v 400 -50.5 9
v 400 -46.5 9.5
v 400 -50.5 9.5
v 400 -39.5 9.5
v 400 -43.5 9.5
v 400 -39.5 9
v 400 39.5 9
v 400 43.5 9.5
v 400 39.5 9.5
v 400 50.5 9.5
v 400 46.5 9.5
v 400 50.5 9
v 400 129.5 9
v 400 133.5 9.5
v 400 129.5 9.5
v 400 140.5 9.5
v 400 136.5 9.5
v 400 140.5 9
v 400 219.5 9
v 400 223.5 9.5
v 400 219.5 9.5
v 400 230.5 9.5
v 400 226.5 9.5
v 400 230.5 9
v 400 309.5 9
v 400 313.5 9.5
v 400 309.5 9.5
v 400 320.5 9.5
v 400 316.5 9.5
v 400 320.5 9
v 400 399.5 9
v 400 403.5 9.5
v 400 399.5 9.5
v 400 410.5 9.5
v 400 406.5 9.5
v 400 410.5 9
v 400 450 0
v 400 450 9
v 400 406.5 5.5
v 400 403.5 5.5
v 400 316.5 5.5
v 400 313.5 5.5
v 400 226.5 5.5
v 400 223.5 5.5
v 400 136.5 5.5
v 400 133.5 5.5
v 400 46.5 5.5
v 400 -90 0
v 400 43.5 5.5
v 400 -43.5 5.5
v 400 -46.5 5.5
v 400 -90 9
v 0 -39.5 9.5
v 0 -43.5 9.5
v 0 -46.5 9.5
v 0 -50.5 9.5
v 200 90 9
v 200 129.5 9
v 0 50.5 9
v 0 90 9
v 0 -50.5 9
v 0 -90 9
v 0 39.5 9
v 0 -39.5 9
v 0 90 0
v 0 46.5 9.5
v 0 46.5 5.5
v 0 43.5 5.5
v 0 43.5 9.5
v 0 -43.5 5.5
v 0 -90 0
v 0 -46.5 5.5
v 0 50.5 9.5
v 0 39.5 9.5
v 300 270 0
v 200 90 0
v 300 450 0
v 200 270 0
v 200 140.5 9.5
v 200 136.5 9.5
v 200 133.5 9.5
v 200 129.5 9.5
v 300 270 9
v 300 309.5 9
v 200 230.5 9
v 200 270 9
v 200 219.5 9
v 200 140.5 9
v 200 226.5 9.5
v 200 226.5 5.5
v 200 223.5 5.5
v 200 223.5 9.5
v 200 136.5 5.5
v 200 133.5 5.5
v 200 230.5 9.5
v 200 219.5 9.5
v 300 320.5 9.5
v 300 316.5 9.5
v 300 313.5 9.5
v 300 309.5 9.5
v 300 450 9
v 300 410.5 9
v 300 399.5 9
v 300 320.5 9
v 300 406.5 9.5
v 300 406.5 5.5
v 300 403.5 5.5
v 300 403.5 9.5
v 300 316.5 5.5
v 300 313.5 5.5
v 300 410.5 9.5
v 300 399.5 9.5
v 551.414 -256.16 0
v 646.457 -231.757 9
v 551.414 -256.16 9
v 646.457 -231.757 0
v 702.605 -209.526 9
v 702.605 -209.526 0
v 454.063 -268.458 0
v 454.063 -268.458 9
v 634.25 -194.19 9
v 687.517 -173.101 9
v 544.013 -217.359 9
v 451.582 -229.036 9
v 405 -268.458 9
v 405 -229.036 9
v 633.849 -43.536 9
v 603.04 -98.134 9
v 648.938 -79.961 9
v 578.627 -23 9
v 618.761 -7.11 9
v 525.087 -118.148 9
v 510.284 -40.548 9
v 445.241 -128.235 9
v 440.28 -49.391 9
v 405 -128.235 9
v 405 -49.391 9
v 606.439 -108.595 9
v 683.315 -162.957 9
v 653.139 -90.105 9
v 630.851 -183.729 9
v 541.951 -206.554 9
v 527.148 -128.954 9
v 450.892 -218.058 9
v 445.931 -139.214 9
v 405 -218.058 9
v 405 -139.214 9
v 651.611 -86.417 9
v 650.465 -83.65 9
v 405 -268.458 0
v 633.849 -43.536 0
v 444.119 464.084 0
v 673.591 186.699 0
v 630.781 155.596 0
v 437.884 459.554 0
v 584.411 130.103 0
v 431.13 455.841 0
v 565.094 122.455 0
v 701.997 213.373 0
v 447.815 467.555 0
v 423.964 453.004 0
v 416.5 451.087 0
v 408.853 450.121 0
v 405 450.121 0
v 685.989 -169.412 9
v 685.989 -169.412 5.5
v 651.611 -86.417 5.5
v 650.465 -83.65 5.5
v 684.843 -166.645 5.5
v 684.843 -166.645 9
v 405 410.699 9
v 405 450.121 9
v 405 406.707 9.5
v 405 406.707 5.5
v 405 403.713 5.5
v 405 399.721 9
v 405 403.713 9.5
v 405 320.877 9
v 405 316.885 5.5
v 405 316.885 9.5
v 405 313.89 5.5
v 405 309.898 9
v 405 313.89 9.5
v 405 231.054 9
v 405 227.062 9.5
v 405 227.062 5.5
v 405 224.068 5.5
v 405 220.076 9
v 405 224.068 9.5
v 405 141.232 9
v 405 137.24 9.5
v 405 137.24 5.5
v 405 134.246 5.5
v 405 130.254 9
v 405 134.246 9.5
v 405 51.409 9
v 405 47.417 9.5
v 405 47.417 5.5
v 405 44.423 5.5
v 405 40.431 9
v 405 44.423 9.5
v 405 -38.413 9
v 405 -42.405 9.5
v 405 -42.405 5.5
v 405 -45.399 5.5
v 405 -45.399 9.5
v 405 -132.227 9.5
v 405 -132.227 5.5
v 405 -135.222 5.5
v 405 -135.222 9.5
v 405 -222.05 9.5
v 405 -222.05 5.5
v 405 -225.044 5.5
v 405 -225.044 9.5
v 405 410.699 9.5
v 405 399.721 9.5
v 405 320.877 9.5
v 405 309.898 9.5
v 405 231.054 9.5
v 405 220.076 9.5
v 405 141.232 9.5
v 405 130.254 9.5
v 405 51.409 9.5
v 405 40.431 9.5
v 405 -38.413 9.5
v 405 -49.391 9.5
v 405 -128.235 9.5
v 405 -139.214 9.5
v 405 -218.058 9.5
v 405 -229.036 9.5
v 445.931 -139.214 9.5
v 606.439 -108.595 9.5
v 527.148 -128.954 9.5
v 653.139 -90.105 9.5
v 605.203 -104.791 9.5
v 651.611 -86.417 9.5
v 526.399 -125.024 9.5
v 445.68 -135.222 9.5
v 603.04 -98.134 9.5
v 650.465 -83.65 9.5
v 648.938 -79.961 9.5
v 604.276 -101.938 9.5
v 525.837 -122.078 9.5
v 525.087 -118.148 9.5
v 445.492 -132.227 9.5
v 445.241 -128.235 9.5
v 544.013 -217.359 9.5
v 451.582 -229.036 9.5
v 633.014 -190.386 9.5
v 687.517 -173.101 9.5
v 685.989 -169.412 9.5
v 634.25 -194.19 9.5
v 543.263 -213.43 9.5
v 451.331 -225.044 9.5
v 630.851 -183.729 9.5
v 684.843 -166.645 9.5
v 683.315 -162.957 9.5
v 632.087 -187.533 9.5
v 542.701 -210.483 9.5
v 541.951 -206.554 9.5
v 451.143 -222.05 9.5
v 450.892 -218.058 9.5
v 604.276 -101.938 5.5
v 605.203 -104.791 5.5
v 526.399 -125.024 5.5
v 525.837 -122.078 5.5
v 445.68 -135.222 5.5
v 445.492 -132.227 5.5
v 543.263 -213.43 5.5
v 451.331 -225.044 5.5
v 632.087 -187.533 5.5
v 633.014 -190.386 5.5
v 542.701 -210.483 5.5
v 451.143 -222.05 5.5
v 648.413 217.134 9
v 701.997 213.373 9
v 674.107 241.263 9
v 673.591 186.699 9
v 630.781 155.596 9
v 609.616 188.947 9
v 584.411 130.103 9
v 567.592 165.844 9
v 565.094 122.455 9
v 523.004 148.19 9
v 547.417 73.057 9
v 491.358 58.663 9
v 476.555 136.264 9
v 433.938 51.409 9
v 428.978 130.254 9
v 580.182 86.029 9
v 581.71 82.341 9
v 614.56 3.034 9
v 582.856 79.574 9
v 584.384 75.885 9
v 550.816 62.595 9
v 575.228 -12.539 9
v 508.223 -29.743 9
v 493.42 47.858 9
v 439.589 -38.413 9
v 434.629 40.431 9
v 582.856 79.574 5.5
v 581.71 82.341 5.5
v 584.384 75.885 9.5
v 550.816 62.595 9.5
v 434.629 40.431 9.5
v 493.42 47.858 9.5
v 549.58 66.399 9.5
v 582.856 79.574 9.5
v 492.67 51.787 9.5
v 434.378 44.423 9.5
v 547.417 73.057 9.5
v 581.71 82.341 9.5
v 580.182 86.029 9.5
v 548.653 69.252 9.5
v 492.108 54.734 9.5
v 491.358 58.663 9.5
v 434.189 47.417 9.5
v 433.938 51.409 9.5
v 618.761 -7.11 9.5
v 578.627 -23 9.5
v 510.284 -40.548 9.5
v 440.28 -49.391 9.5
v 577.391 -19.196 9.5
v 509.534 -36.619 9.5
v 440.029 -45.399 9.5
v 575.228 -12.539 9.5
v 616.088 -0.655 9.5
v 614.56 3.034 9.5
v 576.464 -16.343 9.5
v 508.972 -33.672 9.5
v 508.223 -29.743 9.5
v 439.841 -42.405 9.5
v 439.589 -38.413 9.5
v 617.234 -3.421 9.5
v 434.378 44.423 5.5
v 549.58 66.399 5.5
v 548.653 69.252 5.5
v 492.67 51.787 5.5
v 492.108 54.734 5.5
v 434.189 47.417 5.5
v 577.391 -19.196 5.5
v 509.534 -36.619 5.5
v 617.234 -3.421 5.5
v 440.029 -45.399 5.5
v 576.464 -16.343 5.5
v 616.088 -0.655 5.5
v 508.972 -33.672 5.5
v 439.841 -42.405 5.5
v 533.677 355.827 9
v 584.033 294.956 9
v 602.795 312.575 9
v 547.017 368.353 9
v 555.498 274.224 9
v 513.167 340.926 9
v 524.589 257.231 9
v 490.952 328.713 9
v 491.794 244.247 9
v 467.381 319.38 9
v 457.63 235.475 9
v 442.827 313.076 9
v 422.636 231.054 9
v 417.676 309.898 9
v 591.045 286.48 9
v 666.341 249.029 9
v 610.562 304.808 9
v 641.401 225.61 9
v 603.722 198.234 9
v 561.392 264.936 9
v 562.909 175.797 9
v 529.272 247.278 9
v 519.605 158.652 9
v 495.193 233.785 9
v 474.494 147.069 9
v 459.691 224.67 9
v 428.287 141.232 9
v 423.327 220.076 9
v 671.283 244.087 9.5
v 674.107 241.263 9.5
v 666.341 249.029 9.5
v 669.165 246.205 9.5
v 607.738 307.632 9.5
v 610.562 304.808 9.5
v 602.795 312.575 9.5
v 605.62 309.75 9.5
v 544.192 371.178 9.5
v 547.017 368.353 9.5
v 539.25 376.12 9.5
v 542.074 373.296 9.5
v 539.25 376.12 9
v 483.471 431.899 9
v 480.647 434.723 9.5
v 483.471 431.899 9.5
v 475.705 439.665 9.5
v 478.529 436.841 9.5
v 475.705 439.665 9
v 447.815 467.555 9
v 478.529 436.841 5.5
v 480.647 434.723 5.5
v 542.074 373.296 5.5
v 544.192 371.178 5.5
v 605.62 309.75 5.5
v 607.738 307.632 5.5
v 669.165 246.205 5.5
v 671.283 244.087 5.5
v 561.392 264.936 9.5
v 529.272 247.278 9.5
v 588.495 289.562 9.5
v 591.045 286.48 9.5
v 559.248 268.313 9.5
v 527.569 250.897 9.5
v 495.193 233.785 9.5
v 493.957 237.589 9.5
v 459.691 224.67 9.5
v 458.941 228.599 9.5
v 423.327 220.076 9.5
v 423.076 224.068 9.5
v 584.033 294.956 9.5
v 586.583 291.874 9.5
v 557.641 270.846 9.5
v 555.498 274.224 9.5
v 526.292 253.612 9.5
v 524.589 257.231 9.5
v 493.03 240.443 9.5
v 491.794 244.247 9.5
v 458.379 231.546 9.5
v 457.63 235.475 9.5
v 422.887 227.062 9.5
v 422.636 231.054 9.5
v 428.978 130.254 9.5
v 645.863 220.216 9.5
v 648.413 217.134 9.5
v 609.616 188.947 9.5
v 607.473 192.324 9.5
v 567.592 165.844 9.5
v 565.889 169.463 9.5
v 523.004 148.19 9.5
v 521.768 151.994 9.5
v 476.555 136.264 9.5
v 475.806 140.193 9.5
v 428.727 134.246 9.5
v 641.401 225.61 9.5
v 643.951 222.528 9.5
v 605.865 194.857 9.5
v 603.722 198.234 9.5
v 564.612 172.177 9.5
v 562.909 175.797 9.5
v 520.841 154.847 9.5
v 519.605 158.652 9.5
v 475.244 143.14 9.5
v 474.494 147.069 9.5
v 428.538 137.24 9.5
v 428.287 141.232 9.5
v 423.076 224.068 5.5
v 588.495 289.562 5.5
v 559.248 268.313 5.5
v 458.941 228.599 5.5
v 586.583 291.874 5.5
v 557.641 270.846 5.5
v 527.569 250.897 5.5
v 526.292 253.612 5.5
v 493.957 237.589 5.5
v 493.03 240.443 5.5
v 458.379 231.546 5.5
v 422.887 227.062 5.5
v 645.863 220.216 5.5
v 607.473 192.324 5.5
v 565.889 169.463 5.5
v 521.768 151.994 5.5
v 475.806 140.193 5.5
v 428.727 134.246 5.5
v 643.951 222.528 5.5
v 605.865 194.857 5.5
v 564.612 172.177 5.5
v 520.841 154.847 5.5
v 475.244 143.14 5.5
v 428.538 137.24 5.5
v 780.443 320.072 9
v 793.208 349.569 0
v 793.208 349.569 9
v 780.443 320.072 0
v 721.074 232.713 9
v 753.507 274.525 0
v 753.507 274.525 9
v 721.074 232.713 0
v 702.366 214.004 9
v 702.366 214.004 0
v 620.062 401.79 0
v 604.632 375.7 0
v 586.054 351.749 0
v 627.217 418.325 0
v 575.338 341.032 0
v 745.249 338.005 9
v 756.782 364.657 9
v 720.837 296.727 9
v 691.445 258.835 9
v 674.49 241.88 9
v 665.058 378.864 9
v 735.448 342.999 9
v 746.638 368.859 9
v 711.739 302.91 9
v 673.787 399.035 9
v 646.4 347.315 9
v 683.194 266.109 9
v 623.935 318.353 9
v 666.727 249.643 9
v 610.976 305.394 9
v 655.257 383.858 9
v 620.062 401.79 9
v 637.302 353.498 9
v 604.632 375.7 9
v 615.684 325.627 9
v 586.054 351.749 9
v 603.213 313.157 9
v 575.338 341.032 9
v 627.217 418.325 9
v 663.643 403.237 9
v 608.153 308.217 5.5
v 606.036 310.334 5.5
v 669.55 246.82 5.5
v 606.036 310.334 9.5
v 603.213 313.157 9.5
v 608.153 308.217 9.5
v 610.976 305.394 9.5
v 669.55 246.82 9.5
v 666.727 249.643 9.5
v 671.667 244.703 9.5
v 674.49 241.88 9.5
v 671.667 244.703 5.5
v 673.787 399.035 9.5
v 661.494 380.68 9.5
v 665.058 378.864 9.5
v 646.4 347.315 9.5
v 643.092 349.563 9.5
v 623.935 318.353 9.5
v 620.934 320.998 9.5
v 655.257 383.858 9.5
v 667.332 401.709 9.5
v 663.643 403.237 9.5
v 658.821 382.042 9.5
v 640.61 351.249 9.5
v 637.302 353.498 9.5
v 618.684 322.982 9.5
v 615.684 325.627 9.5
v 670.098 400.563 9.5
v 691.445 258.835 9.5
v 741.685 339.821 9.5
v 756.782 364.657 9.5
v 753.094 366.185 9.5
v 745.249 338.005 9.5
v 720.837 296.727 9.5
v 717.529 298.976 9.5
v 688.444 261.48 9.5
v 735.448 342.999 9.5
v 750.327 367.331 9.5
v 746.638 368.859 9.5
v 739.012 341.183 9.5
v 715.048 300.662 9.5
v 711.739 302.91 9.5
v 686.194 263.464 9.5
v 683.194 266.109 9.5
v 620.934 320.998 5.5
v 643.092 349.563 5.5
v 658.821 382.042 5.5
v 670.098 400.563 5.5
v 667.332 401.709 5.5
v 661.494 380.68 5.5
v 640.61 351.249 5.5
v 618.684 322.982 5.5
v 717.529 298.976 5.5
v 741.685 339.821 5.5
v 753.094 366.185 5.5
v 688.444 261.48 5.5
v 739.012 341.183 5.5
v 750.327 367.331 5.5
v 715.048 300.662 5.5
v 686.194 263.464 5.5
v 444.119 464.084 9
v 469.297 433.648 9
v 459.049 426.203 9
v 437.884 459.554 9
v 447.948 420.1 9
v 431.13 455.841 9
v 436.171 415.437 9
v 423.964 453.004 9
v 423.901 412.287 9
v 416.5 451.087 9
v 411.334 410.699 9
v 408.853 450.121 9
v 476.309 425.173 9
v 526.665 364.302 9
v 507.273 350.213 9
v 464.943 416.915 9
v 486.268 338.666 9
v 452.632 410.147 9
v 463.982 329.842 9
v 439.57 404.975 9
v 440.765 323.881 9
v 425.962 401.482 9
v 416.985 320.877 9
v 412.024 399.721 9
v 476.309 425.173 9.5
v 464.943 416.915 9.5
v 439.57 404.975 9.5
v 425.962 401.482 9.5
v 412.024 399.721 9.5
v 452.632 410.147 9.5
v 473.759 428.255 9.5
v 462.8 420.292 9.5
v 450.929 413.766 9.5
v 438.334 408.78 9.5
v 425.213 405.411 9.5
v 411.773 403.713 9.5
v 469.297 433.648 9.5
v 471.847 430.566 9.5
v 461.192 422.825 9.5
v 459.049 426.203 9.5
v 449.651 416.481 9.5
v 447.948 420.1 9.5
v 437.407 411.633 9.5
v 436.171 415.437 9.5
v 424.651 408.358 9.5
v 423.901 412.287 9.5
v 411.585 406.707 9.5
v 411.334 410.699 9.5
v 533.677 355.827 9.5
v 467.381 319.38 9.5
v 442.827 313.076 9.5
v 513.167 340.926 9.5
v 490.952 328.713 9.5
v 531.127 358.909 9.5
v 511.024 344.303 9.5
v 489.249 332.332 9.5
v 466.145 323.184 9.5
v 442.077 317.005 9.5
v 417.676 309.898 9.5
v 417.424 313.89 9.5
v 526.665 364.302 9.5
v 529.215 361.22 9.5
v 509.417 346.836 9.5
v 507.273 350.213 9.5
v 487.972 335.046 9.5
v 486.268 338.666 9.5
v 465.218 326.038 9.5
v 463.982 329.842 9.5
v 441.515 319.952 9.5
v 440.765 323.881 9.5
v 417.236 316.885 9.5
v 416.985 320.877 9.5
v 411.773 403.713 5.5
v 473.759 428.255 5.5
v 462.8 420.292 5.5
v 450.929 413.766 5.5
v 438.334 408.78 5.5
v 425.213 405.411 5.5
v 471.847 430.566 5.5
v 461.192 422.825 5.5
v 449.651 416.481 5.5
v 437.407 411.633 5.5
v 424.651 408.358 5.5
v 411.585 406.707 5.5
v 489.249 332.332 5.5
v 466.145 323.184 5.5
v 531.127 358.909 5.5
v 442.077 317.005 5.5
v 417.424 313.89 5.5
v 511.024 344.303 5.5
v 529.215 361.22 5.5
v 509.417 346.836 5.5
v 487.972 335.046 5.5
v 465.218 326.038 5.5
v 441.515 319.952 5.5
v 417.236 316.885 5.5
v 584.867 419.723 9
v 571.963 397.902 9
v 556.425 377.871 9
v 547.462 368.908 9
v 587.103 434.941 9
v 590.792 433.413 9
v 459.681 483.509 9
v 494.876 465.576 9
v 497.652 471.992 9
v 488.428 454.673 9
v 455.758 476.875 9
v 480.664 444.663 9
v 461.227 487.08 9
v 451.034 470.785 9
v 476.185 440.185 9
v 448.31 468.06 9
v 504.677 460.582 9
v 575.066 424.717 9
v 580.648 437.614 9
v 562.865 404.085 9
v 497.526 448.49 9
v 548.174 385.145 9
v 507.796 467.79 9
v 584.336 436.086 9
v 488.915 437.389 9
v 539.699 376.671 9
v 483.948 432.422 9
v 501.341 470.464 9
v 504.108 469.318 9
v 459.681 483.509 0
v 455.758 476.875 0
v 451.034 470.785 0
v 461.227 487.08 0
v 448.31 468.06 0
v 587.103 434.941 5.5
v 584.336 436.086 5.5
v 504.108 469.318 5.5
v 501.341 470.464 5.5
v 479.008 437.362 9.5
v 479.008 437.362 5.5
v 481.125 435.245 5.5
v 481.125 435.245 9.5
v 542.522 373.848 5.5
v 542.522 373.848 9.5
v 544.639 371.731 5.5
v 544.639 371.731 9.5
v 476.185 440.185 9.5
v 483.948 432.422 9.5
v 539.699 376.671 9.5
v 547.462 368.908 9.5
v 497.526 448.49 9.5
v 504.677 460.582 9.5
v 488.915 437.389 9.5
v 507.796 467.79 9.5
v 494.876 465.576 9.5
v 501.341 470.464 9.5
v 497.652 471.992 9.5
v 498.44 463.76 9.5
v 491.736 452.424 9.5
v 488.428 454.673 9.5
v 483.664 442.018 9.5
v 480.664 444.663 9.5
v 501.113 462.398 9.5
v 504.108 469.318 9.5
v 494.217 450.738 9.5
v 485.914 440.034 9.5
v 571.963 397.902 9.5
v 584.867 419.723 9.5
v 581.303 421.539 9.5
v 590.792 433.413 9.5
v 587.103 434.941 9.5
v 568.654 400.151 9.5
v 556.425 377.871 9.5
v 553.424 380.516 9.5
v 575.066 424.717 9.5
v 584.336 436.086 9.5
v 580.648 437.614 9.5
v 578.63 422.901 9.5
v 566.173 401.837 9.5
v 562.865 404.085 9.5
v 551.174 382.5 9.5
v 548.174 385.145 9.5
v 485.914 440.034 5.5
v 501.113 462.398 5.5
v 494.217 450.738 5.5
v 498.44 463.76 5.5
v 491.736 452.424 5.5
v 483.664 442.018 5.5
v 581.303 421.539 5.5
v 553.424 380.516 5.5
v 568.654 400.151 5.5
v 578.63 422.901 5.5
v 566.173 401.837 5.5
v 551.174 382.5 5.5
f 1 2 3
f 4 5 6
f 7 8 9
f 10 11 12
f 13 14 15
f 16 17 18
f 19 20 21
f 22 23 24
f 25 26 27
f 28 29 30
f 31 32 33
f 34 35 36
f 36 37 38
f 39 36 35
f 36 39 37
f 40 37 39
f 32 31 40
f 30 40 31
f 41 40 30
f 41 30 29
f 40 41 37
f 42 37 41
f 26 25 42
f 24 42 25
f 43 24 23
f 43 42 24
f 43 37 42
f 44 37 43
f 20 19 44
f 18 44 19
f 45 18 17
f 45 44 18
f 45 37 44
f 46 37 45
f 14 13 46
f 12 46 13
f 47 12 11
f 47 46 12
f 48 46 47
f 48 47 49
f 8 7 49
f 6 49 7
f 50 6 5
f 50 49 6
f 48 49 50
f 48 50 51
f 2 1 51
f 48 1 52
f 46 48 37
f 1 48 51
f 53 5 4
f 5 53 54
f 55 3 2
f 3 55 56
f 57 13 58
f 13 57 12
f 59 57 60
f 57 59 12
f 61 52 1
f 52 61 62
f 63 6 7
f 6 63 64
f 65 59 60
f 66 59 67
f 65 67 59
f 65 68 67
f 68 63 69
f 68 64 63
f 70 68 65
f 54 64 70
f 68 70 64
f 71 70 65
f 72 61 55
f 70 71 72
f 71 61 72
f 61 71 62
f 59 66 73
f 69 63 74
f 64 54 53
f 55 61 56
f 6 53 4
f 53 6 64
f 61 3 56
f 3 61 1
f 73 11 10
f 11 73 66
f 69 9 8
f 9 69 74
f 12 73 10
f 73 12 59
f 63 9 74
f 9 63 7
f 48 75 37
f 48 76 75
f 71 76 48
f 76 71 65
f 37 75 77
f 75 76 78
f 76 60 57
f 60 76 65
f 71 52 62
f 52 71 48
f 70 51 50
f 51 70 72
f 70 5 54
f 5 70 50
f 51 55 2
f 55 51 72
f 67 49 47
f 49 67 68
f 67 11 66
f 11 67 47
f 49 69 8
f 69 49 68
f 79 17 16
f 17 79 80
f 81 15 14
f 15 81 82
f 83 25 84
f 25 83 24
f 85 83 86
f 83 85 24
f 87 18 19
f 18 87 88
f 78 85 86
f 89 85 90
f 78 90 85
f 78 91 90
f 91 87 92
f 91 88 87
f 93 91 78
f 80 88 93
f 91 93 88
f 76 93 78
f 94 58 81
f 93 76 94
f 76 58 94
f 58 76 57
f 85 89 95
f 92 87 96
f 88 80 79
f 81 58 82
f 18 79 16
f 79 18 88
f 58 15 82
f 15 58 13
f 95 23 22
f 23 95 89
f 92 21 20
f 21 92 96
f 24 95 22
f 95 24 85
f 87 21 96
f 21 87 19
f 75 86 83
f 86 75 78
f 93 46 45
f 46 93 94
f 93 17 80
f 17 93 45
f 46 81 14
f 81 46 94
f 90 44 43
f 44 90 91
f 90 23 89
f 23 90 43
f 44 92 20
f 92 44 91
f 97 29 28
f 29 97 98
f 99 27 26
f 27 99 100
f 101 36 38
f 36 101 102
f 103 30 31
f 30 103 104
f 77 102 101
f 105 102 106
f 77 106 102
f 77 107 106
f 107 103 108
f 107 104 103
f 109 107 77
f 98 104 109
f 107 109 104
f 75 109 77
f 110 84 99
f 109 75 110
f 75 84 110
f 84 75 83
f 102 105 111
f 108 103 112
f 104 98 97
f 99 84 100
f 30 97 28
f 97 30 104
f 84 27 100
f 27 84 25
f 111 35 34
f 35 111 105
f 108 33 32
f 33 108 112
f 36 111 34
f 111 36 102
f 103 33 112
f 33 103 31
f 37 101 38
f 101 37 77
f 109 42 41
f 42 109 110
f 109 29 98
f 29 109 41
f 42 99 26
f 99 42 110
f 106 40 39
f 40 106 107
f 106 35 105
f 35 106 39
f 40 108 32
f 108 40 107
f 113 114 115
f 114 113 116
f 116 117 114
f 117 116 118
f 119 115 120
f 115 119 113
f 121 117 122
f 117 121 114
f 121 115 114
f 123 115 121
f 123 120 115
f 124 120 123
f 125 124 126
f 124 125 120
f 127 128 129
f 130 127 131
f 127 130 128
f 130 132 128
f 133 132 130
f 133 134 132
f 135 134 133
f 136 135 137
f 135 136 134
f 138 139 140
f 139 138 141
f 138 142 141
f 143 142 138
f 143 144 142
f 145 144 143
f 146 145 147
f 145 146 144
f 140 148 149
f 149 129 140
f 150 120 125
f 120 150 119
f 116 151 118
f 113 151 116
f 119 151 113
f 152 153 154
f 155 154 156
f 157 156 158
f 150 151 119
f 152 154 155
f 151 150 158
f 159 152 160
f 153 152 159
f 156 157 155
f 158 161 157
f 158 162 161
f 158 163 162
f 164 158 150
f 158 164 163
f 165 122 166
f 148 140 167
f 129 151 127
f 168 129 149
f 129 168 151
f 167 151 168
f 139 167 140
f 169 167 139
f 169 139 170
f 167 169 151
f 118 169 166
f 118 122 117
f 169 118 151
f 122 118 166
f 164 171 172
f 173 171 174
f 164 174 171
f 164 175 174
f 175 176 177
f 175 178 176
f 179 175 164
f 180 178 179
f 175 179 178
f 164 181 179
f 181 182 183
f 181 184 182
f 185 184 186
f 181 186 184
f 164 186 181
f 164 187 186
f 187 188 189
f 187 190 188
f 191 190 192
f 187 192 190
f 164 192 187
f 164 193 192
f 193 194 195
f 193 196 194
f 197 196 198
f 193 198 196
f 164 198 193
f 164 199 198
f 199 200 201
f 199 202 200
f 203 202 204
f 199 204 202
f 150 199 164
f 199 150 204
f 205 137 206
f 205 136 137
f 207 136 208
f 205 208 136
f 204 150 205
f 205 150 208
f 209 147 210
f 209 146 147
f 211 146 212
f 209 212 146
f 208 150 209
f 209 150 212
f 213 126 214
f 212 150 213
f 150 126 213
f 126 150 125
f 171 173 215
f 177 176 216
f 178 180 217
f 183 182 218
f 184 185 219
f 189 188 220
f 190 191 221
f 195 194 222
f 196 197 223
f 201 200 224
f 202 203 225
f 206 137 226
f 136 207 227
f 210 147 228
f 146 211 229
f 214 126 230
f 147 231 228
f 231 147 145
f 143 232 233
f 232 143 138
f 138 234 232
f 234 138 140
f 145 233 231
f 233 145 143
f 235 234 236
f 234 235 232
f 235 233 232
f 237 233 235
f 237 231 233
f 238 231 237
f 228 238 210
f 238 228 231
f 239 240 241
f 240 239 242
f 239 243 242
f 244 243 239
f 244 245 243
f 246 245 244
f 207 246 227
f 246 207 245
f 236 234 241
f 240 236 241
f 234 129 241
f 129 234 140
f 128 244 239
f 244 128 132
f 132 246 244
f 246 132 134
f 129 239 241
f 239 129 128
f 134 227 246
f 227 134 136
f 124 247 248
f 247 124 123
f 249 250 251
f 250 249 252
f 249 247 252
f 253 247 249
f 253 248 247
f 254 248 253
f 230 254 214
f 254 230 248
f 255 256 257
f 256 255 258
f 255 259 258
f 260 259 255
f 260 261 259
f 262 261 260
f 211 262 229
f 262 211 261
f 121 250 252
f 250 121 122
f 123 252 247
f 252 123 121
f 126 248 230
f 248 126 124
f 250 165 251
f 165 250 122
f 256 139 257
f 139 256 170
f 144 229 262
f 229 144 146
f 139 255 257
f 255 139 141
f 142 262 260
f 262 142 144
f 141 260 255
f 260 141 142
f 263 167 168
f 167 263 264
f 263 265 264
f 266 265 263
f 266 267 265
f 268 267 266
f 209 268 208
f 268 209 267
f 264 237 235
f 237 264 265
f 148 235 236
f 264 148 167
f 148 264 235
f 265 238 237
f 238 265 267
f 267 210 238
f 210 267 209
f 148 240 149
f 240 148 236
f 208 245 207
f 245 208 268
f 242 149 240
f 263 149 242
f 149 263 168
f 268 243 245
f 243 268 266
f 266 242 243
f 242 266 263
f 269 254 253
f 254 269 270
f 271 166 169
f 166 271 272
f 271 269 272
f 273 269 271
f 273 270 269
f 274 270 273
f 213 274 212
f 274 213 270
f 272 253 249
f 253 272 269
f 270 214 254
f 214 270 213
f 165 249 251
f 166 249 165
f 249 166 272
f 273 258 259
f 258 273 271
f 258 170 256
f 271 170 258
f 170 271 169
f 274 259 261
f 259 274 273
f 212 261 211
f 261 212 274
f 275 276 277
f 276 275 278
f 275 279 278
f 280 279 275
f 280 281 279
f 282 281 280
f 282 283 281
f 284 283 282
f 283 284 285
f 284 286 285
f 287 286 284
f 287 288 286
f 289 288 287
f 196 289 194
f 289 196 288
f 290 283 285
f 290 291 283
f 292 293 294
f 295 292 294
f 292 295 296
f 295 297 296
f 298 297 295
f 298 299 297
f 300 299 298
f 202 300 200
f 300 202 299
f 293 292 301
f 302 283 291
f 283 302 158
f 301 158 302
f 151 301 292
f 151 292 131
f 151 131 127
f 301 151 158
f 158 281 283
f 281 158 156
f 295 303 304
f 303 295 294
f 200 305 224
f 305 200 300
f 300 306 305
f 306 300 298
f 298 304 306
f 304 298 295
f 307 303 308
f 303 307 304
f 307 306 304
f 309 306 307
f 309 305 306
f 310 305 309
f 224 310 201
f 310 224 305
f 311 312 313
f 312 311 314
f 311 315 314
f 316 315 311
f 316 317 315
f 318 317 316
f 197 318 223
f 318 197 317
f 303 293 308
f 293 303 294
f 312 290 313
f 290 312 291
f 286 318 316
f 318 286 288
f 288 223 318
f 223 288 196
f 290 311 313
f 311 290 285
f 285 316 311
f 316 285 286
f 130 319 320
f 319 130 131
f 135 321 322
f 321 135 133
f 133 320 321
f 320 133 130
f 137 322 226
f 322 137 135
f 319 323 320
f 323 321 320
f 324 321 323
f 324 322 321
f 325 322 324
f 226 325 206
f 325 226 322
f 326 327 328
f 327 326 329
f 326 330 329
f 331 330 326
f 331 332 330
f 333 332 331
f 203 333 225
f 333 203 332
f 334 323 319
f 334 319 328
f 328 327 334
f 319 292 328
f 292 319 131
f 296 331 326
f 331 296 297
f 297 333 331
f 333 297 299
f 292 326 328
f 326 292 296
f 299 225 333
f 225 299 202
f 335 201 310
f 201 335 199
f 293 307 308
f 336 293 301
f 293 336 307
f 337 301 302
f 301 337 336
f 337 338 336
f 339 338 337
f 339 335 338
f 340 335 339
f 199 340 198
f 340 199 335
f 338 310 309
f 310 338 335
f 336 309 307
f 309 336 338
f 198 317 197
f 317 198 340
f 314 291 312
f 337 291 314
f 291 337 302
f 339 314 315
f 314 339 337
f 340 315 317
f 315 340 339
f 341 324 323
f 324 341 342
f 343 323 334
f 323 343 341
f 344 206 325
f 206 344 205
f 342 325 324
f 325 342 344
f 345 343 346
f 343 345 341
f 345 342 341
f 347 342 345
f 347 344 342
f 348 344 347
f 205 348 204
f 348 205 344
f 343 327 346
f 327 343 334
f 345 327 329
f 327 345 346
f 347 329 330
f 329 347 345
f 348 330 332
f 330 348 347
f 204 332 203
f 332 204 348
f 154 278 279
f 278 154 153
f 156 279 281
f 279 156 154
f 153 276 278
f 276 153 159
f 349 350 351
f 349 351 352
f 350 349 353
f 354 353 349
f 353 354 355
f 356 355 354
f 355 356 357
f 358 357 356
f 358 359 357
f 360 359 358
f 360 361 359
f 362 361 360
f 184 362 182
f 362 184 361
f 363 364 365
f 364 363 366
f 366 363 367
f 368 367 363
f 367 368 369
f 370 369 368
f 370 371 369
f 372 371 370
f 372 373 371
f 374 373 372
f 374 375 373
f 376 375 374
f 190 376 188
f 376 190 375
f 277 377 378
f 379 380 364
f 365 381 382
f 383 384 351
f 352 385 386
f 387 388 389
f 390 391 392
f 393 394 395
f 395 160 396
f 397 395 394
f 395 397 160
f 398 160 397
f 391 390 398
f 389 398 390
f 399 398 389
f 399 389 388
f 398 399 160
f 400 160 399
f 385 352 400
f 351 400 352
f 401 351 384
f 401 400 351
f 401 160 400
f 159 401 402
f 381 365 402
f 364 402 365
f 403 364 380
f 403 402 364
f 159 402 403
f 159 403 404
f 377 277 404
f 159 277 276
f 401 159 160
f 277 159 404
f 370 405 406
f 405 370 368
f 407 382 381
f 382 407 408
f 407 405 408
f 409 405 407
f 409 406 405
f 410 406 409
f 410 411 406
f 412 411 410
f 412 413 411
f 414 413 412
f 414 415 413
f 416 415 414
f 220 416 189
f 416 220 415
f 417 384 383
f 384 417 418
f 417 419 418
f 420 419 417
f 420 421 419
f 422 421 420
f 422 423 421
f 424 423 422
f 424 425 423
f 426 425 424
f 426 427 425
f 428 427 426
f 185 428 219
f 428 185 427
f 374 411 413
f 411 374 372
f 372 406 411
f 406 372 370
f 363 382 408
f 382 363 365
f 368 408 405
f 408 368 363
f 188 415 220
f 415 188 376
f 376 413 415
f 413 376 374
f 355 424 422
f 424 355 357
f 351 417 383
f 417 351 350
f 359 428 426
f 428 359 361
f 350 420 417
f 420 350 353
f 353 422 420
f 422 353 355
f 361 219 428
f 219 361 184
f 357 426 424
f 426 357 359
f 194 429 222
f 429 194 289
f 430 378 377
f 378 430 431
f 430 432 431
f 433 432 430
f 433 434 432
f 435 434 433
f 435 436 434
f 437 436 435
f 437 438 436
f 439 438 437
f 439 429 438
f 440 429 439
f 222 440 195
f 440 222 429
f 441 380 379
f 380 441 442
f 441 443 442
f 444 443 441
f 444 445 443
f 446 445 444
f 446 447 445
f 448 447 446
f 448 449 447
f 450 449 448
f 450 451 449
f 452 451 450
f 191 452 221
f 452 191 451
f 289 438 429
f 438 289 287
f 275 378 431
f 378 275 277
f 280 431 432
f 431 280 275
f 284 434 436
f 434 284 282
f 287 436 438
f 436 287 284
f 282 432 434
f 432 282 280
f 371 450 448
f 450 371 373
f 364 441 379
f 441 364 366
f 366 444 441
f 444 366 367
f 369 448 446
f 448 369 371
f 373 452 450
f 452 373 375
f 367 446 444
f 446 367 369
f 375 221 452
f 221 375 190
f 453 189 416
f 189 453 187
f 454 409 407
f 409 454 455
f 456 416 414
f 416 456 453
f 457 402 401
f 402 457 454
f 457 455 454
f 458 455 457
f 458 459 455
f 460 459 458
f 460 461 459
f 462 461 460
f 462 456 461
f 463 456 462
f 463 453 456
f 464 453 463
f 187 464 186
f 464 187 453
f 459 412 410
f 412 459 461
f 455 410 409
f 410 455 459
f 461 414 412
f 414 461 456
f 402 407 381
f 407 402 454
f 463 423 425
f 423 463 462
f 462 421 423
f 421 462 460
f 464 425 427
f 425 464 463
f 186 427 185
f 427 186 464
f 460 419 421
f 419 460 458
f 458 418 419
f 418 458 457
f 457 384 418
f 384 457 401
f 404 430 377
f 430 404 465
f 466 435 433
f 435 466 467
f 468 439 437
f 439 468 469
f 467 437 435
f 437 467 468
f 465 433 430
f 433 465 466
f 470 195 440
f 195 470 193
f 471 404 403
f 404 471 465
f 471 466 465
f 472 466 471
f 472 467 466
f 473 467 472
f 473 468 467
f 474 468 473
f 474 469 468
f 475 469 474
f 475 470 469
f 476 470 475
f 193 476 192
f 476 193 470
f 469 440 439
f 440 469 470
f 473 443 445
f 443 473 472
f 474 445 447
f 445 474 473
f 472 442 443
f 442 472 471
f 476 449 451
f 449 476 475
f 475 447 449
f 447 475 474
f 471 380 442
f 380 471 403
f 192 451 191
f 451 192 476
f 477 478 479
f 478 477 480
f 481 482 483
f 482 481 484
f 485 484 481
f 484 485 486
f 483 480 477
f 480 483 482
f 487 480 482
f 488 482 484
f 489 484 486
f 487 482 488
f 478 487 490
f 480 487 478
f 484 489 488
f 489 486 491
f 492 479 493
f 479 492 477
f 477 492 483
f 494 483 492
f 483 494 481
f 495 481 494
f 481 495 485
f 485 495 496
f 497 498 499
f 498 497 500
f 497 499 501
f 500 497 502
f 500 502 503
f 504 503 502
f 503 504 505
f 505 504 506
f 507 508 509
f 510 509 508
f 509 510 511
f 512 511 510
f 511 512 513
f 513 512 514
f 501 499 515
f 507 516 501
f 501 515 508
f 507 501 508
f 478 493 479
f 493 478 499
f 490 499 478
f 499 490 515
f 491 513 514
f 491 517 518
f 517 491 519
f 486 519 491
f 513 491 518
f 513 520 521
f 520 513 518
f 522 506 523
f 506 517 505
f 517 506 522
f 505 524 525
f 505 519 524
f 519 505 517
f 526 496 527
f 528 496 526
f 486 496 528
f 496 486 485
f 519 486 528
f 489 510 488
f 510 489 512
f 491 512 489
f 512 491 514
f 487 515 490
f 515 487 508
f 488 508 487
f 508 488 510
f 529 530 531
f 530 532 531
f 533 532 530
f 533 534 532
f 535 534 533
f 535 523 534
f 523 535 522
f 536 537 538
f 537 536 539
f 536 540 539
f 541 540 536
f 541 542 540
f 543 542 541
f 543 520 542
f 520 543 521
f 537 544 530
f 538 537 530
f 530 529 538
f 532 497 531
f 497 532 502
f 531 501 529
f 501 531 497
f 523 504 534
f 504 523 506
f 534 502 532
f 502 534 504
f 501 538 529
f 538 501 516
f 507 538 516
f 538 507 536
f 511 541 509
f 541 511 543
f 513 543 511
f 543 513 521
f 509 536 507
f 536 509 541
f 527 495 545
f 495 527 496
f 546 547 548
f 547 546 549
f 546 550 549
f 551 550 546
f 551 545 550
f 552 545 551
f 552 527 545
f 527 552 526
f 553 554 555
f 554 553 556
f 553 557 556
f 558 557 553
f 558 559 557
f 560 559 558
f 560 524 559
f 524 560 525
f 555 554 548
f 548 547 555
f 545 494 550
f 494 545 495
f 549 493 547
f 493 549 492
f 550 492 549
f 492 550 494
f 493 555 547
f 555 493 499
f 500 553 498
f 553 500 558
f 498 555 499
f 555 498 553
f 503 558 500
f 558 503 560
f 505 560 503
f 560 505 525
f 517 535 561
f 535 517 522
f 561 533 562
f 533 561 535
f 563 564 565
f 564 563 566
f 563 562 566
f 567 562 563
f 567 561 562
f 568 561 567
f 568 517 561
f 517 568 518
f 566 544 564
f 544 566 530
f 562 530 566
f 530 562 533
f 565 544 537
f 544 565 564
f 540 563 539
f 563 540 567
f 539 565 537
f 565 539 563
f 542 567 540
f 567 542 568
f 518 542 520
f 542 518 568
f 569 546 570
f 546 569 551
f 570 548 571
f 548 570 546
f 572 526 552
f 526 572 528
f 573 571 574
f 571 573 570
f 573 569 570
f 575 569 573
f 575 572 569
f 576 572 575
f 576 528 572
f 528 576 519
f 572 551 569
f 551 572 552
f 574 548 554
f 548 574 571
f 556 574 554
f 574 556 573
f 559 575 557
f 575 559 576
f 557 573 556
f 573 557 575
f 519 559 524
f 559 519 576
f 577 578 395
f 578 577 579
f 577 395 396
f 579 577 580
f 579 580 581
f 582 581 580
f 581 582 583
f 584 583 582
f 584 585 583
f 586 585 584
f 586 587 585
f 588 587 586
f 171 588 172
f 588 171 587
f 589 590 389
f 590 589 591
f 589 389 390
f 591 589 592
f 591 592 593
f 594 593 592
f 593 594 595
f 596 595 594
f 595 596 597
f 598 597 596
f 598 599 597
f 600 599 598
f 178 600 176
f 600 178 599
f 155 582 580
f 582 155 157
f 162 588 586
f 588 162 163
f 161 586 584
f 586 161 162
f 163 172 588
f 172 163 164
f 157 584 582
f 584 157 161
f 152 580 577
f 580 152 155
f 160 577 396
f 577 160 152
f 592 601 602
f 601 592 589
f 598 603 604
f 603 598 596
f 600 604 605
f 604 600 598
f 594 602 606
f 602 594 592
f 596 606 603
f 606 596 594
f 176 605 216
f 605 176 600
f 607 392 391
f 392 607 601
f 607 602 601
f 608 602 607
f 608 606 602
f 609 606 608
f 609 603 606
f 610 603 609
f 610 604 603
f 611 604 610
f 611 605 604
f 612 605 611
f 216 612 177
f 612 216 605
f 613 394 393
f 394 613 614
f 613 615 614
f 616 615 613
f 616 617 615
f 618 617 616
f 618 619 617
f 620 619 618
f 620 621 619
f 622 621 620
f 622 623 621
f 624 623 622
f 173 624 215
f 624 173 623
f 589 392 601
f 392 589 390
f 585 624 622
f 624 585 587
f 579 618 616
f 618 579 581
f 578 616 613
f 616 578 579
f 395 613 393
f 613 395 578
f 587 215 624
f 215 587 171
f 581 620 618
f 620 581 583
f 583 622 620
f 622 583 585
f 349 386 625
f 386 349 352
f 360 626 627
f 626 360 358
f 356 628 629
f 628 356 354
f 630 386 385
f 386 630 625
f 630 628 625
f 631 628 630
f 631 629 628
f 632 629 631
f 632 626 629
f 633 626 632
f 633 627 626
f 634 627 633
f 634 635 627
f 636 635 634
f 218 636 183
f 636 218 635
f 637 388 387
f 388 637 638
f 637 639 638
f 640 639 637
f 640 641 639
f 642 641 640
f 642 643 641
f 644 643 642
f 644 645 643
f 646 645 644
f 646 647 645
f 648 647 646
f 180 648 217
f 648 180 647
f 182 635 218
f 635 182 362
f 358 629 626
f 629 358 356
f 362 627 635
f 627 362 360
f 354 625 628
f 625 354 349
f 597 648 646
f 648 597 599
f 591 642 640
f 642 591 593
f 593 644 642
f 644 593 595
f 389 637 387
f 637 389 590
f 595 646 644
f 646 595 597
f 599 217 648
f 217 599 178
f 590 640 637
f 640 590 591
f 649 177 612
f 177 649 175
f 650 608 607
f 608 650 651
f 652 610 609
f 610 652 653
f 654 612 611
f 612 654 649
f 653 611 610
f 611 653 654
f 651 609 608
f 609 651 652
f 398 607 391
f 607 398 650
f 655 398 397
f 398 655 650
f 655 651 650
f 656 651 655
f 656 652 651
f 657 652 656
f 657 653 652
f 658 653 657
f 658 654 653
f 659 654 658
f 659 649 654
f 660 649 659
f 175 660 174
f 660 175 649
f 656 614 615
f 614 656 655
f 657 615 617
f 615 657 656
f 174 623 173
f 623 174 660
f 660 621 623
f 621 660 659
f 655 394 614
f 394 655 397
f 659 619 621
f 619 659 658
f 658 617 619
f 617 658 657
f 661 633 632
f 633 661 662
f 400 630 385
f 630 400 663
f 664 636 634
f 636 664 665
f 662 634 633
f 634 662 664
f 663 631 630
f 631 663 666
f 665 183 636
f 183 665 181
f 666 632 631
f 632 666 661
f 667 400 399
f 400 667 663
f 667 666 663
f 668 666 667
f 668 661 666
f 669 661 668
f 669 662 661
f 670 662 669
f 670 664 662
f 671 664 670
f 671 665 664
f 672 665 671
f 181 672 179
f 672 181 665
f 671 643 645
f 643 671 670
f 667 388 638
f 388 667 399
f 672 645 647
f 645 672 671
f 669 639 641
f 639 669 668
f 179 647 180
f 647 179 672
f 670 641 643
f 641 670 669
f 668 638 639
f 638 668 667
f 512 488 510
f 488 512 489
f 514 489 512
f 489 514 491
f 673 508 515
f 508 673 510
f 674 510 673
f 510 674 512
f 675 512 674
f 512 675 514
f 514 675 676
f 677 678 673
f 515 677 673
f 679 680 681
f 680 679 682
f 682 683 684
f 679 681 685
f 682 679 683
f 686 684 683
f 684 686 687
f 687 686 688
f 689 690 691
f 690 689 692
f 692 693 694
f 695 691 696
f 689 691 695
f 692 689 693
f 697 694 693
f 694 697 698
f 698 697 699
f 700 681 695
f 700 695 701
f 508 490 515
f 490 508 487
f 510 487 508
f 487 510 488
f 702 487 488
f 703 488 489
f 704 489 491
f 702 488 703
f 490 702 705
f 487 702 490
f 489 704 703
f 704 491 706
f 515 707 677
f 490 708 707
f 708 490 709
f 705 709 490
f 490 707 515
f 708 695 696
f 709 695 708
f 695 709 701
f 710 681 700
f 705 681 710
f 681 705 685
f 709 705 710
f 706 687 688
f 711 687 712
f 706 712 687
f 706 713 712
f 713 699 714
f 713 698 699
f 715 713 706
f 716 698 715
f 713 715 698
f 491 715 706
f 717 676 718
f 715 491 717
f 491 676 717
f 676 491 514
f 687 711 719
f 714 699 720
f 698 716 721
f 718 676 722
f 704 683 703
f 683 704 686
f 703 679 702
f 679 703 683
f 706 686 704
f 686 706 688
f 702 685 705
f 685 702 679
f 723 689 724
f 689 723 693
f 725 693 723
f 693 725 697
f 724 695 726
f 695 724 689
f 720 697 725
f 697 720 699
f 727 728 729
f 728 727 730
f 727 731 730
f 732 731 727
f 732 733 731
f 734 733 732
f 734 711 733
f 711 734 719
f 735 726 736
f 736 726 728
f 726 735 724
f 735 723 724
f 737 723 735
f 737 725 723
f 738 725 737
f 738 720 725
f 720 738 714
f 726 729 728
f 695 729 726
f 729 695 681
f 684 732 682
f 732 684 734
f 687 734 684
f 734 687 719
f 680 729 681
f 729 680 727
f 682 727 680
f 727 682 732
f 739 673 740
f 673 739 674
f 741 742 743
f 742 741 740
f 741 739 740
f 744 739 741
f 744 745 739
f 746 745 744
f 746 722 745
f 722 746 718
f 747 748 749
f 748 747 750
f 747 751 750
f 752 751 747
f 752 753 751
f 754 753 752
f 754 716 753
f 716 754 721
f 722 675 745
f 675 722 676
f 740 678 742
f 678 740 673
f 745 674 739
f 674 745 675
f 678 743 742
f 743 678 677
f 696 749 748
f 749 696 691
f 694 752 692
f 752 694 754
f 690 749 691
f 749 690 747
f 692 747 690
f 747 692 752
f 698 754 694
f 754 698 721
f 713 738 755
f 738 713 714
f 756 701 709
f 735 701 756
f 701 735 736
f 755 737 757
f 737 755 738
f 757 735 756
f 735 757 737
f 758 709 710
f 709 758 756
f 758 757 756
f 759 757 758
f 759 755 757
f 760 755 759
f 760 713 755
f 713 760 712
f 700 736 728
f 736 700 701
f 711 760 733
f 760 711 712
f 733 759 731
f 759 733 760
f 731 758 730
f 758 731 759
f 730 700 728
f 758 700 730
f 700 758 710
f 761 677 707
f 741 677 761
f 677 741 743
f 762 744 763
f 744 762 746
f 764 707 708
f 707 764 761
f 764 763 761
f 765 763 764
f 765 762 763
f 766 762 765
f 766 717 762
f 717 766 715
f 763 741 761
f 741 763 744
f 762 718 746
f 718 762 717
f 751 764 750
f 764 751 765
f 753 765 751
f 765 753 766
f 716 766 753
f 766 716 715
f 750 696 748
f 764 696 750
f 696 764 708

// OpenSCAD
/**
 * ninco.scad
 * 
 * Models for Ninco(r) tracks. Visit www.ninco.com
 * For visualization only
 * 
 * Created by Diego Viejo
 * 
 */

nincoTrackHeight = 9; //TODO Check this!
nincoTrackWidth = 180;
nincoStraightLength = 400;

nincoRad1 = 61.37; //radio menor de la curva interior
nincoRad2 = nincoRad1 + nincoTrackWidth; //radio mayor de la curva interior = radio menor curva estandar
nincoRad3 = nincoRad2 + nincoTrackWidth; //radio mayor curva estandar = radio menor curva exterior
nincoRad4 = nincoRad3 + nincoTrackWidth; //radio mayor curva exterior = radio menor curva superexterior
nincoRad5 = nincoRad4 + nincoTrackWidth; //radio mayor curva superexterior

nincoTrack1 = 45;
nincoTrack2 = 90+nincoTrack1;

slotWidth = 3;				//TODO: Check
copperWidth = 4 + 4 + slotWidth;	//TODO Check
slotDepth = 3.5;
$fn=50;


module straight(l=nincoStraightLength)
{
  difference()
  {
    union()
    {
      color("DimGray") cube([l, nincoTrackWidth, nincoTrackHeight]);
      color("Gainsboro")
      {
	translate([0, nincoTrack1 - copperWidth/2, nincoTrackHeight]) cube([l, copperWidth, 0.5]);
	translate([0, nincoTrack2 - copperWidth/2, nincoTrackHeight]) cube([l, copperWidth, 0.5]);
      }
    }
    
    color("DimGray")
    {
      translate([-1, nincoTrack1 - slotWidth/2, nincoTrackHeight-slotDepth]) cube([l+2, slotWidth, slotDepth+0.5+0.1]);
      translate([-1, nincoTrack2 - slotWidth/2, nincoTrackHeight-slotDepth]) cube([l+2, slotWidth, slotDepth+0.5+0.1]);
    }
    
  }
}

module nincoCurve(r1=nincoRad1, r2=nincoRad2, deg = 45, center = true)
{
  aux = center == true? (r2-r1)/2 : 0;
  translate([0, -aux, 0]) difference()
  {
    union()
    {
      color("DimGray")nincoCurvedSlot(r1=r1, r2=r2, d=nincoTrackHeight, center = false, deg=deg);
      
      color("Gainsboro")
      {
	translate([0, nincoTrackWidth-nincoTrack1, nincoTrackHeight]) nincoCurvedSlot(r1 = r1+nincoTrack1-copperWidth/2, r2 = r1+nincoTrack1+copperWidth/2, d=0.5, deg=deg);
	translate([0, nincoTrackWidth-nincoTrack2, nincoTrackHeight]) nincoCurvedSlot(r1 = r1+nincoTrack2-copperWidth/2, r2 = r1+nincoTrack2+copperWidth/2, d=0.5, deg=deg);
      }
    }
    
    color("DimGray")
    {
	translate([0, nincoTrackWidth-nincoTrack1, nincoTrackHeight-slotDepth]) nincoCurvedSlot(r1 = r1+nincoTrack1-slotWidth/2, r2 = r1+nincoTrack1+slotWidth/2, d=slotDepth+0.5+0.1, deg=deg);
	translate([0, nincoTrackWidth-nincoTrack2, nincoTrackHeight-slotDepth]) nincoCurvedSlot(r1 = r1+nincoTrack2-slotWidth/2, r2 = r1+nincoTrack2+slotWidth/2, d=slotDepth+0.5+0.1, deg=deg);
    }
  }
}

module nincoCurvedSlot(r1=nincoRad1-slotWidth/2, r2=nincoRad1+slotWidth/2, d=slotDepth, deg=45, center = true)
{
  aux = center == true? (r2-r1)/2 : 0;
  translate([0, r2-aux, 0]) difference()
  {
    cylinder(r=r2, h=d);
    
    translate([-1, 0, -1]) cube([r2+2, r2+1, d+2]); 
    translate([-1, 0, -1]) rotate(-90+deg) cube([r2+2, r2+1, d+2]); 
    translate([-r2-1, -r2-1, -1]) cube([r2+1, 2*r2+2, d+2]);
    translate([0, 0, -2]) cylinder(r=r1, h=d+4);
  }
}

module nincoStraight() translate([0, -nincoTrackWidth/2, 0]) straight();
module nincoHalfStraight() translate([0, -nincoTrackWidth/2, 0])
  straight(l=nincoStraightLength/2);
module nincoQuarterStraight() translate([0, -nincoTrackWidth/2, 0])
  straight(l=nincoStraightLength/4);

module nincoInterior() nincoCurve();
module nincoHalfInterior() nincoCurve(deg=45/2);
module nincoStandard() nincoCurve(r1=nincoRad2, r2=nincoRad3);
module nincoHalfStandard() nincoCurve(r1=nincoRad2, r2=nincoRad3, deg=45/2);
module nincoExterior() nincoCurve(r1=nincoRad3, r2=nincoRad4, deg=45/2);
module nincoSuperExt() nincoCurve(r1=nincoRad4, r2=nincoRad5, deg=45/2);

nincoStraight();
translate([200, 180, 0]) nincoHalfStraight();
translate([300, 180*2, 0]) nincoQuarterStraight();

translate([405, -180, 0]) nincoSuperExt();
translate([405, 0, 0]) nincoExterior();
translate([405, 180, 0]) nincoStandard();
h2=nincoRad2+(nincoRad3-nincoRad2)/2;
translate([405, 180, 0]) 
  translate([h2*sin(45), h2-h2*cos(45), 0]) //El angulo anterior
    rotate(45) 				 //El angulo anterior
      nincoHalfStandard();
translate([405, 180*2, 0]) nincoInterior();
h=nincoRad1+(nincoRad2-nincoRad1)/2;
translate([405, 180*2, 0]) 
  translate([h*sin(45), h-h*cos(45), 0]) //El angulo anterior
    rotate(45) 				 //El angulo anterior
	nincoHalfInterior();
//nincoCurvedSlot(r1=nincoRad1, r2=nincoRad2, d=nincoTrackHeight, center = false);
